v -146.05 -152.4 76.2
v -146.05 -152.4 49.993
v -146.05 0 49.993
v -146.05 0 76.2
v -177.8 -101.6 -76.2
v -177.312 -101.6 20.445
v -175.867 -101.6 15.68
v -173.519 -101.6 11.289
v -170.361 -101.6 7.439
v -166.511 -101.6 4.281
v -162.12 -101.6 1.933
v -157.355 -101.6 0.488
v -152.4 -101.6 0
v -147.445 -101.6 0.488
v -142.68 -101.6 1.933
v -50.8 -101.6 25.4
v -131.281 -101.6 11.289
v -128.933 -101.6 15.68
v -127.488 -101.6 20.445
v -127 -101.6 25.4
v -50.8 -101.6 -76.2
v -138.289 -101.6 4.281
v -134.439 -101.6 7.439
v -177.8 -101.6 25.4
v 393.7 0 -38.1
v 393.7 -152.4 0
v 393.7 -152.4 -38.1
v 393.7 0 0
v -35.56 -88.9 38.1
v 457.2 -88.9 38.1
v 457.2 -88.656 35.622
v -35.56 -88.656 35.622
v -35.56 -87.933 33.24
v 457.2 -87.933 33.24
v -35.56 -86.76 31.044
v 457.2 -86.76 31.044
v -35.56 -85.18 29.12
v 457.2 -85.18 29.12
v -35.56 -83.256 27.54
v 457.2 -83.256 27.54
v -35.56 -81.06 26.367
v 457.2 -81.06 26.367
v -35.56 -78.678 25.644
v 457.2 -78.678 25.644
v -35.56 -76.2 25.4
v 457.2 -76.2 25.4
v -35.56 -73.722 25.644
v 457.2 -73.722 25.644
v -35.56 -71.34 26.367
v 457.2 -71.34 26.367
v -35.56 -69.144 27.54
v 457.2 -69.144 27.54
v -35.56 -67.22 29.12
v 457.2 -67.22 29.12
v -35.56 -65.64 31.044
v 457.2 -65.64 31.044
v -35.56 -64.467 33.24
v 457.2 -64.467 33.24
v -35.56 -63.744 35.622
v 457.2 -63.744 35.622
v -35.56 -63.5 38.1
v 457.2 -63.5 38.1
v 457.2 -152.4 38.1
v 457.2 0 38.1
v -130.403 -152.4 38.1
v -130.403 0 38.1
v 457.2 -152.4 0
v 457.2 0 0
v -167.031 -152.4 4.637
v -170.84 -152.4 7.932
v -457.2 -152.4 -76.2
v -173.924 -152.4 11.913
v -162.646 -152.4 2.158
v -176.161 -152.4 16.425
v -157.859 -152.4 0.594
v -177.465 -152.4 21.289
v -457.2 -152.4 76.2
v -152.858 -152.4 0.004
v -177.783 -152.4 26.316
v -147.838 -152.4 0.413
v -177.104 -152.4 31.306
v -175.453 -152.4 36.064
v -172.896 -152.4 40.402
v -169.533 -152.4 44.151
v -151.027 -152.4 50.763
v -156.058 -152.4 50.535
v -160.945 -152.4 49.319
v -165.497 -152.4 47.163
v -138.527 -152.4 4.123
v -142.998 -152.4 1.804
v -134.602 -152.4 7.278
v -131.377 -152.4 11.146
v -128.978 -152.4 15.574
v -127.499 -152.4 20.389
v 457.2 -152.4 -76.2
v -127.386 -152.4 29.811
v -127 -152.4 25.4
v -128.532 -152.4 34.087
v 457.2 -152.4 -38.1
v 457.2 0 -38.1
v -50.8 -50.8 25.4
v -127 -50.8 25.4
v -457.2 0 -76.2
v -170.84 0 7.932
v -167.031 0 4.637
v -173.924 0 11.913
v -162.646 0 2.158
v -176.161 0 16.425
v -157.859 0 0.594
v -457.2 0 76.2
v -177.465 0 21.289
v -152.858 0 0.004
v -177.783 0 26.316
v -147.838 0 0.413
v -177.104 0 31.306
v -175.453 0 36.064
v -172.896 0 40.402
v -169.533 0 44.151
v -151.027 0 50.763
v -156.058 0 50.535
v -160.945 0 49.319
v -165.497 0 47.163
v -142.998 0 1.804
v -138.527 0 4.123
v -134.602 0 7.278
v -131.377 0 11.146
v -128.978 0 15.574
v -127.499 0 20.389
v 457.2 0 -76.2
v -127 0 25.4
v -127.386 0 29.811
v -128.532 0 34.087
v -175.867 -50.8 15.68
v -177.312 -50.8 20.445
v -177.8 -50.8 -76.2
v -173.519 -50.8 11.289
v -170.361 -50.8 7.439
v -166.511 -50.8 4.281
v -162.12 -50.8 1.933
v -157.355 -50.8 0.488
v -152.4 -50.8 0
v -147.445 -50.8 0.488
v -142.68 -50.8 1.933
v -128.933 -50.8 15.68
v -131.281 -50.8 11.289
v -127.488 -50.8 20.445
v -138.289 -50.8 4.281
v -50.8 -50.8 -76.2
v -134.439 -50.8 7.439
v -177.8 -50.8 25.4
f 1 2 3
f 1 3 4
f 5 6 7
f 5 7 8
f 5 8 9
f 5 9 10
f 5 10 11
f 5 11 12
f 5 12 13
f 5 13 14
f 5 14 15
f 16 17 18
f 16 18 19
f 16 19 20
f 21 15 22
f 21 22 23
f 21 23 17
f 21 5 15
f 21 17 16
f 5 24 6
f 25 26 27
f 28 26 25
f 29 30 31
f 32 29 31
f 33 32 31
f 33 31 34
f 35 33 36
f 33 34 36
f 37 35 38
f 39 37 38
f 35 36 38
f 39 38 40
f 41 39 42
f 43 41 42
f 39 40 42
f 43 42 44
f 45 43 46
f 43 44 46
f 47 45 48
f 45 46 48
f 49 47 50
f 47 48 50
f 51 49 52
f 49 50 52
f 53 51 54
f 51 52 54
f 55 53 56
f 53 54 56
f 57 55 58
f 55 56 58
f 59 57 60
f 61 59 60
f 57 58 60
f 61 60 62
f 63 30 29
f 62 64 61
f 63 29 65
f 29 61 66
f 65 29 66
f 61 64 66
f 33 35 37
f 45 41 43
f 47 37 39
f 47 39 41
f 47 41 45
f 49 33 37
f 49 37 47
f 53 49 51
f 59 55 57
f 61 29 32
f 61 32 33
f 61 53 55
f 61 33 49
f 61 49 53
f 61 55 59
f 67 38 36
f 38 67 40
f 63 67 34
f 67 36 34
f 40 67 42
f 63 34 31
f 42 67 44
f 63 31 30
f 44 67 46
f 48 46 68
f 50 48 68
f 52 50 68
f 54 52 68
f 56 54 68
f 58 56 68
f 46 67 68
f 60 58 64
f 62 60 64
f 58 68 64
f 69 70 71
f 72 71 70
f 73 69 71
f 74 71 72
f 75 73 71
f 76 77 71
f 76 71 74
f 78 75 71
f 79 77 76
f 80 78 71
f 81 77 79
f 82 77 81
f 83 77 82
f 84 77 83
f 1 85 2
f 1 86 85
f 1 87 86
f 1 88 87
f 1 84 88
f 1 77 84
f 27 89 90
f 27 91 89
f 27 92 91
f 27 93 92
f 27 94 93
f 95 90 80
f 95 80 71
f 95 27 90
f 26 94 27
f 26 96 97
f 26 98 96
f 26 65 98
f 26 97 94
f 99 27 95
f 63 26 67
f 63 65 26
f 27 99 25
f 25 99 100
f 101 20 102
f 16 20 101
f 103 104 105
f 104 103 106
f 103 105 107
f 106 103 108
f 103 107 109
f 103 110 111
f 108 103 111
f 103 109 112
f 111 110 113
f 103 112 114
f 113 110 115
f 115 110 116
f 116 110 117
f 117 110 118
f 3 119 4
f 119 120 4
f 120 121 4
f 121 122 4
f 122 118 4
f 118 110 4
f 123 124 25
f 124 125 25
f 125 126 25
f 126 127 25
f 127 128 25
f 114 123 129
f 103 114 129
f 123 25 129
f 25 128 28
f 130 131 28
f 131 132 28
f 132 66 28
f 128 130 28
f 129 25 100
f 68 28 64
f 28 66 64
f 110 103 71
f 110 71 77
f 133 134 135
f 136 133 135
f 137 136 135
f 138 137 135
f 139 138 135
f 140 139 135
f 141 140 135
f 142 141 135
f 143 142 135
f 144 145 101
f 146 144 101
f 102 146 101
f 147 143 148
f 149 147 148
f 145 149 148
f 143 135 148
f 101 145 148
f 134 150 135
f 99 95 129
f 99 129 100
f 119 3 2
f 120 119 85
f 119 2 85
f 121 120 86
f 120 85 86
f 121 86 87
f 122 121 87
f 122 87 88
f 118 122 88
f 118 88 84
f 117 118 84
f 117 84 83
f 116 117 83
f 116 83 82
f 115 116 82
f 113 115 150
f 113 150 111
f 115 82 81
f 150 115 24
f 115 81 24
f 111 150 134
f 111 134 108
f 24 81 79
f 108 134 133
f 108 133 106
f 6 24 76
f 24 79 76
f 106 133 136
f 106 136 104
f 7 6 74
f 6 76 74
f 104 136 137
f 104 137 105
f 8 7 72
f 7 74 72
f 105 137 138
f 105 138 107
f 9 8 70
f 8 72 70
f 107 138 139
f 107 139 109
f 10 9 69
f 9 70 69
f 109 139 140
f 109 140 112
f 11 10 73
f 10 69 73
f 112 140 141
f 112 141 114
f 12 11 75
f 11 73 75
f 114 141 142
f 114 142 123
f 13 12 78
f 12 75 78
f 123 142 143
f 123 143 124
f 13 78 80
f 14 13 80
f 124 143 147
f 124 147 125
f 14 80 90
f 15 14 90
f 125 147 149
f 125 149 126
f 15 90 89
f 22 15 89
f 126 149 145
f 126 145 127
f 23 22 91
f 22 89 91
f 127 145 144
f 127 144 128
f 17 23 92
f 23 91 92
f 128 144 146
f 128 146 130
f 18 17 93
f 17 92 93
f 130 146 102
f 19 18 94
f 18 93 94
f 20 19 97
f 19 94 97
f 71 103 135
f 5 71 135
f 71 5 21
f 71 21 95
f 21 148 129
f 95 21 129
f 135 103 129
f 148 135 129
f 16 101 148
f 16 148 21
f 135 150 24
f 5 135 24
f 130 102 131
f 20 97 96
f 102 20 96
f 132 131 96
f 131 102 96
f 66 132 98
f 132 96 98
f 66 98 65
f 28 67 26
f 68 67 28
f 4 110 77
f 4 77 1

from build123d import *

# Parameters (mm, degrees)
F0_W      = 914.4
F0_H      = 152.4
F1_DEPTH  = 152.4
F2_W      = 127
F2_H      = 50.8
F3_DEPTH  = 101.6
F4_R      = 25.4
F5_DEPTH  = 337.82
F7_DEPTH  = 274.32
F9_DEPTH  = 492.76
F10_W     = 152.4
F10_H     = 38.1
F11_DEPTH = 63.5


with BuildPart() as f1:
    # F0 (on Front) → F1 (new body)
    with BuildSketch(Plane.XZ):
        Rectangle(F0_W, F0_H)
    extrude(amount=F1_DEPTH)

    # F2 (on face) → F3 (cut)
    with BuildSketch(Plane(origin=(0, 0, -76.2), x_dir=(1, 0, 0), z_dir=(0, 0, -1))):
        with Locations((-114.3, 76.2)):
            Rectangle(F2_W, F2_H)
    extrude(amount=-F3_DEPTH, mode=Mode.SUBTRACT)

    # F4 (on face) → F5 (cut)
    with BuildSketch(Plane.XZ.offset(152.4)):
        with Locations((-152.4, 25.4)):
            Circle(F4_R)
    extrude(amount=-F5_DEPTH, mode=Mode.SUBTRACT)

    # F6 (on face) → F7 (cut)
    with BuildSketch(Plane(origin=(0, 0, 0), x_dir=(-1, 0, 0), z_dir=(0, 1, 0))):
        with BuildLine():
            Line((130.4029547439, 38.1), (146.05, 38.1))
            Line((146.05, 38.1), (146.05, 49.9934442484))
            ThreePointArc((146.05, 49.9934442484), (137.0295007332, 45.6214676097), (130.4029547439, 38.1))
        make_face()
        with BuildLine():
            Line((-457.2, 38.1), (130.4029547439, 38.1))
            ThreePointArc((130.4029547439, 38.1), (137.0295007332, 45.6214676097), (146.05, 49.9934442484))
            Line((146.05, 49.9934442484), (146.05, 76.2))
            Line((146.05, 76.2), (-457.2, 76.2))
            Line((-457.2, 76.2), (-457.2, 38.1))
        make_face()
    extrude(amount=-F7_DEPTH, mode=Mode.SUBTRACT)

    # F8 (on face) → F9 (cut)
    with BuildSketch(Plane.YZ.offset(457.2)):
        with BuildLine():
            ThreePointArc((-88.9, 38.1), (-76.2, 25.4), (-63.5, 38.1))
            Line((-63.5, 38.1), (-88.9, 38.1))
        make_face()
    extrude(amount=-F9_DEPTH, mode=Mode.SUBTRACT)

    # F10 (on face) → F11 (cut)
    with BuildSketch(Plane.YZ.offset(457.2)):
        with Locations((-76.2, -19.05)):
            Rectangle(F10_W, F10_H)
    extrude(amount=-F11_DEPTH, mode=Mode.SUBTRACT)


solid = f1.part
